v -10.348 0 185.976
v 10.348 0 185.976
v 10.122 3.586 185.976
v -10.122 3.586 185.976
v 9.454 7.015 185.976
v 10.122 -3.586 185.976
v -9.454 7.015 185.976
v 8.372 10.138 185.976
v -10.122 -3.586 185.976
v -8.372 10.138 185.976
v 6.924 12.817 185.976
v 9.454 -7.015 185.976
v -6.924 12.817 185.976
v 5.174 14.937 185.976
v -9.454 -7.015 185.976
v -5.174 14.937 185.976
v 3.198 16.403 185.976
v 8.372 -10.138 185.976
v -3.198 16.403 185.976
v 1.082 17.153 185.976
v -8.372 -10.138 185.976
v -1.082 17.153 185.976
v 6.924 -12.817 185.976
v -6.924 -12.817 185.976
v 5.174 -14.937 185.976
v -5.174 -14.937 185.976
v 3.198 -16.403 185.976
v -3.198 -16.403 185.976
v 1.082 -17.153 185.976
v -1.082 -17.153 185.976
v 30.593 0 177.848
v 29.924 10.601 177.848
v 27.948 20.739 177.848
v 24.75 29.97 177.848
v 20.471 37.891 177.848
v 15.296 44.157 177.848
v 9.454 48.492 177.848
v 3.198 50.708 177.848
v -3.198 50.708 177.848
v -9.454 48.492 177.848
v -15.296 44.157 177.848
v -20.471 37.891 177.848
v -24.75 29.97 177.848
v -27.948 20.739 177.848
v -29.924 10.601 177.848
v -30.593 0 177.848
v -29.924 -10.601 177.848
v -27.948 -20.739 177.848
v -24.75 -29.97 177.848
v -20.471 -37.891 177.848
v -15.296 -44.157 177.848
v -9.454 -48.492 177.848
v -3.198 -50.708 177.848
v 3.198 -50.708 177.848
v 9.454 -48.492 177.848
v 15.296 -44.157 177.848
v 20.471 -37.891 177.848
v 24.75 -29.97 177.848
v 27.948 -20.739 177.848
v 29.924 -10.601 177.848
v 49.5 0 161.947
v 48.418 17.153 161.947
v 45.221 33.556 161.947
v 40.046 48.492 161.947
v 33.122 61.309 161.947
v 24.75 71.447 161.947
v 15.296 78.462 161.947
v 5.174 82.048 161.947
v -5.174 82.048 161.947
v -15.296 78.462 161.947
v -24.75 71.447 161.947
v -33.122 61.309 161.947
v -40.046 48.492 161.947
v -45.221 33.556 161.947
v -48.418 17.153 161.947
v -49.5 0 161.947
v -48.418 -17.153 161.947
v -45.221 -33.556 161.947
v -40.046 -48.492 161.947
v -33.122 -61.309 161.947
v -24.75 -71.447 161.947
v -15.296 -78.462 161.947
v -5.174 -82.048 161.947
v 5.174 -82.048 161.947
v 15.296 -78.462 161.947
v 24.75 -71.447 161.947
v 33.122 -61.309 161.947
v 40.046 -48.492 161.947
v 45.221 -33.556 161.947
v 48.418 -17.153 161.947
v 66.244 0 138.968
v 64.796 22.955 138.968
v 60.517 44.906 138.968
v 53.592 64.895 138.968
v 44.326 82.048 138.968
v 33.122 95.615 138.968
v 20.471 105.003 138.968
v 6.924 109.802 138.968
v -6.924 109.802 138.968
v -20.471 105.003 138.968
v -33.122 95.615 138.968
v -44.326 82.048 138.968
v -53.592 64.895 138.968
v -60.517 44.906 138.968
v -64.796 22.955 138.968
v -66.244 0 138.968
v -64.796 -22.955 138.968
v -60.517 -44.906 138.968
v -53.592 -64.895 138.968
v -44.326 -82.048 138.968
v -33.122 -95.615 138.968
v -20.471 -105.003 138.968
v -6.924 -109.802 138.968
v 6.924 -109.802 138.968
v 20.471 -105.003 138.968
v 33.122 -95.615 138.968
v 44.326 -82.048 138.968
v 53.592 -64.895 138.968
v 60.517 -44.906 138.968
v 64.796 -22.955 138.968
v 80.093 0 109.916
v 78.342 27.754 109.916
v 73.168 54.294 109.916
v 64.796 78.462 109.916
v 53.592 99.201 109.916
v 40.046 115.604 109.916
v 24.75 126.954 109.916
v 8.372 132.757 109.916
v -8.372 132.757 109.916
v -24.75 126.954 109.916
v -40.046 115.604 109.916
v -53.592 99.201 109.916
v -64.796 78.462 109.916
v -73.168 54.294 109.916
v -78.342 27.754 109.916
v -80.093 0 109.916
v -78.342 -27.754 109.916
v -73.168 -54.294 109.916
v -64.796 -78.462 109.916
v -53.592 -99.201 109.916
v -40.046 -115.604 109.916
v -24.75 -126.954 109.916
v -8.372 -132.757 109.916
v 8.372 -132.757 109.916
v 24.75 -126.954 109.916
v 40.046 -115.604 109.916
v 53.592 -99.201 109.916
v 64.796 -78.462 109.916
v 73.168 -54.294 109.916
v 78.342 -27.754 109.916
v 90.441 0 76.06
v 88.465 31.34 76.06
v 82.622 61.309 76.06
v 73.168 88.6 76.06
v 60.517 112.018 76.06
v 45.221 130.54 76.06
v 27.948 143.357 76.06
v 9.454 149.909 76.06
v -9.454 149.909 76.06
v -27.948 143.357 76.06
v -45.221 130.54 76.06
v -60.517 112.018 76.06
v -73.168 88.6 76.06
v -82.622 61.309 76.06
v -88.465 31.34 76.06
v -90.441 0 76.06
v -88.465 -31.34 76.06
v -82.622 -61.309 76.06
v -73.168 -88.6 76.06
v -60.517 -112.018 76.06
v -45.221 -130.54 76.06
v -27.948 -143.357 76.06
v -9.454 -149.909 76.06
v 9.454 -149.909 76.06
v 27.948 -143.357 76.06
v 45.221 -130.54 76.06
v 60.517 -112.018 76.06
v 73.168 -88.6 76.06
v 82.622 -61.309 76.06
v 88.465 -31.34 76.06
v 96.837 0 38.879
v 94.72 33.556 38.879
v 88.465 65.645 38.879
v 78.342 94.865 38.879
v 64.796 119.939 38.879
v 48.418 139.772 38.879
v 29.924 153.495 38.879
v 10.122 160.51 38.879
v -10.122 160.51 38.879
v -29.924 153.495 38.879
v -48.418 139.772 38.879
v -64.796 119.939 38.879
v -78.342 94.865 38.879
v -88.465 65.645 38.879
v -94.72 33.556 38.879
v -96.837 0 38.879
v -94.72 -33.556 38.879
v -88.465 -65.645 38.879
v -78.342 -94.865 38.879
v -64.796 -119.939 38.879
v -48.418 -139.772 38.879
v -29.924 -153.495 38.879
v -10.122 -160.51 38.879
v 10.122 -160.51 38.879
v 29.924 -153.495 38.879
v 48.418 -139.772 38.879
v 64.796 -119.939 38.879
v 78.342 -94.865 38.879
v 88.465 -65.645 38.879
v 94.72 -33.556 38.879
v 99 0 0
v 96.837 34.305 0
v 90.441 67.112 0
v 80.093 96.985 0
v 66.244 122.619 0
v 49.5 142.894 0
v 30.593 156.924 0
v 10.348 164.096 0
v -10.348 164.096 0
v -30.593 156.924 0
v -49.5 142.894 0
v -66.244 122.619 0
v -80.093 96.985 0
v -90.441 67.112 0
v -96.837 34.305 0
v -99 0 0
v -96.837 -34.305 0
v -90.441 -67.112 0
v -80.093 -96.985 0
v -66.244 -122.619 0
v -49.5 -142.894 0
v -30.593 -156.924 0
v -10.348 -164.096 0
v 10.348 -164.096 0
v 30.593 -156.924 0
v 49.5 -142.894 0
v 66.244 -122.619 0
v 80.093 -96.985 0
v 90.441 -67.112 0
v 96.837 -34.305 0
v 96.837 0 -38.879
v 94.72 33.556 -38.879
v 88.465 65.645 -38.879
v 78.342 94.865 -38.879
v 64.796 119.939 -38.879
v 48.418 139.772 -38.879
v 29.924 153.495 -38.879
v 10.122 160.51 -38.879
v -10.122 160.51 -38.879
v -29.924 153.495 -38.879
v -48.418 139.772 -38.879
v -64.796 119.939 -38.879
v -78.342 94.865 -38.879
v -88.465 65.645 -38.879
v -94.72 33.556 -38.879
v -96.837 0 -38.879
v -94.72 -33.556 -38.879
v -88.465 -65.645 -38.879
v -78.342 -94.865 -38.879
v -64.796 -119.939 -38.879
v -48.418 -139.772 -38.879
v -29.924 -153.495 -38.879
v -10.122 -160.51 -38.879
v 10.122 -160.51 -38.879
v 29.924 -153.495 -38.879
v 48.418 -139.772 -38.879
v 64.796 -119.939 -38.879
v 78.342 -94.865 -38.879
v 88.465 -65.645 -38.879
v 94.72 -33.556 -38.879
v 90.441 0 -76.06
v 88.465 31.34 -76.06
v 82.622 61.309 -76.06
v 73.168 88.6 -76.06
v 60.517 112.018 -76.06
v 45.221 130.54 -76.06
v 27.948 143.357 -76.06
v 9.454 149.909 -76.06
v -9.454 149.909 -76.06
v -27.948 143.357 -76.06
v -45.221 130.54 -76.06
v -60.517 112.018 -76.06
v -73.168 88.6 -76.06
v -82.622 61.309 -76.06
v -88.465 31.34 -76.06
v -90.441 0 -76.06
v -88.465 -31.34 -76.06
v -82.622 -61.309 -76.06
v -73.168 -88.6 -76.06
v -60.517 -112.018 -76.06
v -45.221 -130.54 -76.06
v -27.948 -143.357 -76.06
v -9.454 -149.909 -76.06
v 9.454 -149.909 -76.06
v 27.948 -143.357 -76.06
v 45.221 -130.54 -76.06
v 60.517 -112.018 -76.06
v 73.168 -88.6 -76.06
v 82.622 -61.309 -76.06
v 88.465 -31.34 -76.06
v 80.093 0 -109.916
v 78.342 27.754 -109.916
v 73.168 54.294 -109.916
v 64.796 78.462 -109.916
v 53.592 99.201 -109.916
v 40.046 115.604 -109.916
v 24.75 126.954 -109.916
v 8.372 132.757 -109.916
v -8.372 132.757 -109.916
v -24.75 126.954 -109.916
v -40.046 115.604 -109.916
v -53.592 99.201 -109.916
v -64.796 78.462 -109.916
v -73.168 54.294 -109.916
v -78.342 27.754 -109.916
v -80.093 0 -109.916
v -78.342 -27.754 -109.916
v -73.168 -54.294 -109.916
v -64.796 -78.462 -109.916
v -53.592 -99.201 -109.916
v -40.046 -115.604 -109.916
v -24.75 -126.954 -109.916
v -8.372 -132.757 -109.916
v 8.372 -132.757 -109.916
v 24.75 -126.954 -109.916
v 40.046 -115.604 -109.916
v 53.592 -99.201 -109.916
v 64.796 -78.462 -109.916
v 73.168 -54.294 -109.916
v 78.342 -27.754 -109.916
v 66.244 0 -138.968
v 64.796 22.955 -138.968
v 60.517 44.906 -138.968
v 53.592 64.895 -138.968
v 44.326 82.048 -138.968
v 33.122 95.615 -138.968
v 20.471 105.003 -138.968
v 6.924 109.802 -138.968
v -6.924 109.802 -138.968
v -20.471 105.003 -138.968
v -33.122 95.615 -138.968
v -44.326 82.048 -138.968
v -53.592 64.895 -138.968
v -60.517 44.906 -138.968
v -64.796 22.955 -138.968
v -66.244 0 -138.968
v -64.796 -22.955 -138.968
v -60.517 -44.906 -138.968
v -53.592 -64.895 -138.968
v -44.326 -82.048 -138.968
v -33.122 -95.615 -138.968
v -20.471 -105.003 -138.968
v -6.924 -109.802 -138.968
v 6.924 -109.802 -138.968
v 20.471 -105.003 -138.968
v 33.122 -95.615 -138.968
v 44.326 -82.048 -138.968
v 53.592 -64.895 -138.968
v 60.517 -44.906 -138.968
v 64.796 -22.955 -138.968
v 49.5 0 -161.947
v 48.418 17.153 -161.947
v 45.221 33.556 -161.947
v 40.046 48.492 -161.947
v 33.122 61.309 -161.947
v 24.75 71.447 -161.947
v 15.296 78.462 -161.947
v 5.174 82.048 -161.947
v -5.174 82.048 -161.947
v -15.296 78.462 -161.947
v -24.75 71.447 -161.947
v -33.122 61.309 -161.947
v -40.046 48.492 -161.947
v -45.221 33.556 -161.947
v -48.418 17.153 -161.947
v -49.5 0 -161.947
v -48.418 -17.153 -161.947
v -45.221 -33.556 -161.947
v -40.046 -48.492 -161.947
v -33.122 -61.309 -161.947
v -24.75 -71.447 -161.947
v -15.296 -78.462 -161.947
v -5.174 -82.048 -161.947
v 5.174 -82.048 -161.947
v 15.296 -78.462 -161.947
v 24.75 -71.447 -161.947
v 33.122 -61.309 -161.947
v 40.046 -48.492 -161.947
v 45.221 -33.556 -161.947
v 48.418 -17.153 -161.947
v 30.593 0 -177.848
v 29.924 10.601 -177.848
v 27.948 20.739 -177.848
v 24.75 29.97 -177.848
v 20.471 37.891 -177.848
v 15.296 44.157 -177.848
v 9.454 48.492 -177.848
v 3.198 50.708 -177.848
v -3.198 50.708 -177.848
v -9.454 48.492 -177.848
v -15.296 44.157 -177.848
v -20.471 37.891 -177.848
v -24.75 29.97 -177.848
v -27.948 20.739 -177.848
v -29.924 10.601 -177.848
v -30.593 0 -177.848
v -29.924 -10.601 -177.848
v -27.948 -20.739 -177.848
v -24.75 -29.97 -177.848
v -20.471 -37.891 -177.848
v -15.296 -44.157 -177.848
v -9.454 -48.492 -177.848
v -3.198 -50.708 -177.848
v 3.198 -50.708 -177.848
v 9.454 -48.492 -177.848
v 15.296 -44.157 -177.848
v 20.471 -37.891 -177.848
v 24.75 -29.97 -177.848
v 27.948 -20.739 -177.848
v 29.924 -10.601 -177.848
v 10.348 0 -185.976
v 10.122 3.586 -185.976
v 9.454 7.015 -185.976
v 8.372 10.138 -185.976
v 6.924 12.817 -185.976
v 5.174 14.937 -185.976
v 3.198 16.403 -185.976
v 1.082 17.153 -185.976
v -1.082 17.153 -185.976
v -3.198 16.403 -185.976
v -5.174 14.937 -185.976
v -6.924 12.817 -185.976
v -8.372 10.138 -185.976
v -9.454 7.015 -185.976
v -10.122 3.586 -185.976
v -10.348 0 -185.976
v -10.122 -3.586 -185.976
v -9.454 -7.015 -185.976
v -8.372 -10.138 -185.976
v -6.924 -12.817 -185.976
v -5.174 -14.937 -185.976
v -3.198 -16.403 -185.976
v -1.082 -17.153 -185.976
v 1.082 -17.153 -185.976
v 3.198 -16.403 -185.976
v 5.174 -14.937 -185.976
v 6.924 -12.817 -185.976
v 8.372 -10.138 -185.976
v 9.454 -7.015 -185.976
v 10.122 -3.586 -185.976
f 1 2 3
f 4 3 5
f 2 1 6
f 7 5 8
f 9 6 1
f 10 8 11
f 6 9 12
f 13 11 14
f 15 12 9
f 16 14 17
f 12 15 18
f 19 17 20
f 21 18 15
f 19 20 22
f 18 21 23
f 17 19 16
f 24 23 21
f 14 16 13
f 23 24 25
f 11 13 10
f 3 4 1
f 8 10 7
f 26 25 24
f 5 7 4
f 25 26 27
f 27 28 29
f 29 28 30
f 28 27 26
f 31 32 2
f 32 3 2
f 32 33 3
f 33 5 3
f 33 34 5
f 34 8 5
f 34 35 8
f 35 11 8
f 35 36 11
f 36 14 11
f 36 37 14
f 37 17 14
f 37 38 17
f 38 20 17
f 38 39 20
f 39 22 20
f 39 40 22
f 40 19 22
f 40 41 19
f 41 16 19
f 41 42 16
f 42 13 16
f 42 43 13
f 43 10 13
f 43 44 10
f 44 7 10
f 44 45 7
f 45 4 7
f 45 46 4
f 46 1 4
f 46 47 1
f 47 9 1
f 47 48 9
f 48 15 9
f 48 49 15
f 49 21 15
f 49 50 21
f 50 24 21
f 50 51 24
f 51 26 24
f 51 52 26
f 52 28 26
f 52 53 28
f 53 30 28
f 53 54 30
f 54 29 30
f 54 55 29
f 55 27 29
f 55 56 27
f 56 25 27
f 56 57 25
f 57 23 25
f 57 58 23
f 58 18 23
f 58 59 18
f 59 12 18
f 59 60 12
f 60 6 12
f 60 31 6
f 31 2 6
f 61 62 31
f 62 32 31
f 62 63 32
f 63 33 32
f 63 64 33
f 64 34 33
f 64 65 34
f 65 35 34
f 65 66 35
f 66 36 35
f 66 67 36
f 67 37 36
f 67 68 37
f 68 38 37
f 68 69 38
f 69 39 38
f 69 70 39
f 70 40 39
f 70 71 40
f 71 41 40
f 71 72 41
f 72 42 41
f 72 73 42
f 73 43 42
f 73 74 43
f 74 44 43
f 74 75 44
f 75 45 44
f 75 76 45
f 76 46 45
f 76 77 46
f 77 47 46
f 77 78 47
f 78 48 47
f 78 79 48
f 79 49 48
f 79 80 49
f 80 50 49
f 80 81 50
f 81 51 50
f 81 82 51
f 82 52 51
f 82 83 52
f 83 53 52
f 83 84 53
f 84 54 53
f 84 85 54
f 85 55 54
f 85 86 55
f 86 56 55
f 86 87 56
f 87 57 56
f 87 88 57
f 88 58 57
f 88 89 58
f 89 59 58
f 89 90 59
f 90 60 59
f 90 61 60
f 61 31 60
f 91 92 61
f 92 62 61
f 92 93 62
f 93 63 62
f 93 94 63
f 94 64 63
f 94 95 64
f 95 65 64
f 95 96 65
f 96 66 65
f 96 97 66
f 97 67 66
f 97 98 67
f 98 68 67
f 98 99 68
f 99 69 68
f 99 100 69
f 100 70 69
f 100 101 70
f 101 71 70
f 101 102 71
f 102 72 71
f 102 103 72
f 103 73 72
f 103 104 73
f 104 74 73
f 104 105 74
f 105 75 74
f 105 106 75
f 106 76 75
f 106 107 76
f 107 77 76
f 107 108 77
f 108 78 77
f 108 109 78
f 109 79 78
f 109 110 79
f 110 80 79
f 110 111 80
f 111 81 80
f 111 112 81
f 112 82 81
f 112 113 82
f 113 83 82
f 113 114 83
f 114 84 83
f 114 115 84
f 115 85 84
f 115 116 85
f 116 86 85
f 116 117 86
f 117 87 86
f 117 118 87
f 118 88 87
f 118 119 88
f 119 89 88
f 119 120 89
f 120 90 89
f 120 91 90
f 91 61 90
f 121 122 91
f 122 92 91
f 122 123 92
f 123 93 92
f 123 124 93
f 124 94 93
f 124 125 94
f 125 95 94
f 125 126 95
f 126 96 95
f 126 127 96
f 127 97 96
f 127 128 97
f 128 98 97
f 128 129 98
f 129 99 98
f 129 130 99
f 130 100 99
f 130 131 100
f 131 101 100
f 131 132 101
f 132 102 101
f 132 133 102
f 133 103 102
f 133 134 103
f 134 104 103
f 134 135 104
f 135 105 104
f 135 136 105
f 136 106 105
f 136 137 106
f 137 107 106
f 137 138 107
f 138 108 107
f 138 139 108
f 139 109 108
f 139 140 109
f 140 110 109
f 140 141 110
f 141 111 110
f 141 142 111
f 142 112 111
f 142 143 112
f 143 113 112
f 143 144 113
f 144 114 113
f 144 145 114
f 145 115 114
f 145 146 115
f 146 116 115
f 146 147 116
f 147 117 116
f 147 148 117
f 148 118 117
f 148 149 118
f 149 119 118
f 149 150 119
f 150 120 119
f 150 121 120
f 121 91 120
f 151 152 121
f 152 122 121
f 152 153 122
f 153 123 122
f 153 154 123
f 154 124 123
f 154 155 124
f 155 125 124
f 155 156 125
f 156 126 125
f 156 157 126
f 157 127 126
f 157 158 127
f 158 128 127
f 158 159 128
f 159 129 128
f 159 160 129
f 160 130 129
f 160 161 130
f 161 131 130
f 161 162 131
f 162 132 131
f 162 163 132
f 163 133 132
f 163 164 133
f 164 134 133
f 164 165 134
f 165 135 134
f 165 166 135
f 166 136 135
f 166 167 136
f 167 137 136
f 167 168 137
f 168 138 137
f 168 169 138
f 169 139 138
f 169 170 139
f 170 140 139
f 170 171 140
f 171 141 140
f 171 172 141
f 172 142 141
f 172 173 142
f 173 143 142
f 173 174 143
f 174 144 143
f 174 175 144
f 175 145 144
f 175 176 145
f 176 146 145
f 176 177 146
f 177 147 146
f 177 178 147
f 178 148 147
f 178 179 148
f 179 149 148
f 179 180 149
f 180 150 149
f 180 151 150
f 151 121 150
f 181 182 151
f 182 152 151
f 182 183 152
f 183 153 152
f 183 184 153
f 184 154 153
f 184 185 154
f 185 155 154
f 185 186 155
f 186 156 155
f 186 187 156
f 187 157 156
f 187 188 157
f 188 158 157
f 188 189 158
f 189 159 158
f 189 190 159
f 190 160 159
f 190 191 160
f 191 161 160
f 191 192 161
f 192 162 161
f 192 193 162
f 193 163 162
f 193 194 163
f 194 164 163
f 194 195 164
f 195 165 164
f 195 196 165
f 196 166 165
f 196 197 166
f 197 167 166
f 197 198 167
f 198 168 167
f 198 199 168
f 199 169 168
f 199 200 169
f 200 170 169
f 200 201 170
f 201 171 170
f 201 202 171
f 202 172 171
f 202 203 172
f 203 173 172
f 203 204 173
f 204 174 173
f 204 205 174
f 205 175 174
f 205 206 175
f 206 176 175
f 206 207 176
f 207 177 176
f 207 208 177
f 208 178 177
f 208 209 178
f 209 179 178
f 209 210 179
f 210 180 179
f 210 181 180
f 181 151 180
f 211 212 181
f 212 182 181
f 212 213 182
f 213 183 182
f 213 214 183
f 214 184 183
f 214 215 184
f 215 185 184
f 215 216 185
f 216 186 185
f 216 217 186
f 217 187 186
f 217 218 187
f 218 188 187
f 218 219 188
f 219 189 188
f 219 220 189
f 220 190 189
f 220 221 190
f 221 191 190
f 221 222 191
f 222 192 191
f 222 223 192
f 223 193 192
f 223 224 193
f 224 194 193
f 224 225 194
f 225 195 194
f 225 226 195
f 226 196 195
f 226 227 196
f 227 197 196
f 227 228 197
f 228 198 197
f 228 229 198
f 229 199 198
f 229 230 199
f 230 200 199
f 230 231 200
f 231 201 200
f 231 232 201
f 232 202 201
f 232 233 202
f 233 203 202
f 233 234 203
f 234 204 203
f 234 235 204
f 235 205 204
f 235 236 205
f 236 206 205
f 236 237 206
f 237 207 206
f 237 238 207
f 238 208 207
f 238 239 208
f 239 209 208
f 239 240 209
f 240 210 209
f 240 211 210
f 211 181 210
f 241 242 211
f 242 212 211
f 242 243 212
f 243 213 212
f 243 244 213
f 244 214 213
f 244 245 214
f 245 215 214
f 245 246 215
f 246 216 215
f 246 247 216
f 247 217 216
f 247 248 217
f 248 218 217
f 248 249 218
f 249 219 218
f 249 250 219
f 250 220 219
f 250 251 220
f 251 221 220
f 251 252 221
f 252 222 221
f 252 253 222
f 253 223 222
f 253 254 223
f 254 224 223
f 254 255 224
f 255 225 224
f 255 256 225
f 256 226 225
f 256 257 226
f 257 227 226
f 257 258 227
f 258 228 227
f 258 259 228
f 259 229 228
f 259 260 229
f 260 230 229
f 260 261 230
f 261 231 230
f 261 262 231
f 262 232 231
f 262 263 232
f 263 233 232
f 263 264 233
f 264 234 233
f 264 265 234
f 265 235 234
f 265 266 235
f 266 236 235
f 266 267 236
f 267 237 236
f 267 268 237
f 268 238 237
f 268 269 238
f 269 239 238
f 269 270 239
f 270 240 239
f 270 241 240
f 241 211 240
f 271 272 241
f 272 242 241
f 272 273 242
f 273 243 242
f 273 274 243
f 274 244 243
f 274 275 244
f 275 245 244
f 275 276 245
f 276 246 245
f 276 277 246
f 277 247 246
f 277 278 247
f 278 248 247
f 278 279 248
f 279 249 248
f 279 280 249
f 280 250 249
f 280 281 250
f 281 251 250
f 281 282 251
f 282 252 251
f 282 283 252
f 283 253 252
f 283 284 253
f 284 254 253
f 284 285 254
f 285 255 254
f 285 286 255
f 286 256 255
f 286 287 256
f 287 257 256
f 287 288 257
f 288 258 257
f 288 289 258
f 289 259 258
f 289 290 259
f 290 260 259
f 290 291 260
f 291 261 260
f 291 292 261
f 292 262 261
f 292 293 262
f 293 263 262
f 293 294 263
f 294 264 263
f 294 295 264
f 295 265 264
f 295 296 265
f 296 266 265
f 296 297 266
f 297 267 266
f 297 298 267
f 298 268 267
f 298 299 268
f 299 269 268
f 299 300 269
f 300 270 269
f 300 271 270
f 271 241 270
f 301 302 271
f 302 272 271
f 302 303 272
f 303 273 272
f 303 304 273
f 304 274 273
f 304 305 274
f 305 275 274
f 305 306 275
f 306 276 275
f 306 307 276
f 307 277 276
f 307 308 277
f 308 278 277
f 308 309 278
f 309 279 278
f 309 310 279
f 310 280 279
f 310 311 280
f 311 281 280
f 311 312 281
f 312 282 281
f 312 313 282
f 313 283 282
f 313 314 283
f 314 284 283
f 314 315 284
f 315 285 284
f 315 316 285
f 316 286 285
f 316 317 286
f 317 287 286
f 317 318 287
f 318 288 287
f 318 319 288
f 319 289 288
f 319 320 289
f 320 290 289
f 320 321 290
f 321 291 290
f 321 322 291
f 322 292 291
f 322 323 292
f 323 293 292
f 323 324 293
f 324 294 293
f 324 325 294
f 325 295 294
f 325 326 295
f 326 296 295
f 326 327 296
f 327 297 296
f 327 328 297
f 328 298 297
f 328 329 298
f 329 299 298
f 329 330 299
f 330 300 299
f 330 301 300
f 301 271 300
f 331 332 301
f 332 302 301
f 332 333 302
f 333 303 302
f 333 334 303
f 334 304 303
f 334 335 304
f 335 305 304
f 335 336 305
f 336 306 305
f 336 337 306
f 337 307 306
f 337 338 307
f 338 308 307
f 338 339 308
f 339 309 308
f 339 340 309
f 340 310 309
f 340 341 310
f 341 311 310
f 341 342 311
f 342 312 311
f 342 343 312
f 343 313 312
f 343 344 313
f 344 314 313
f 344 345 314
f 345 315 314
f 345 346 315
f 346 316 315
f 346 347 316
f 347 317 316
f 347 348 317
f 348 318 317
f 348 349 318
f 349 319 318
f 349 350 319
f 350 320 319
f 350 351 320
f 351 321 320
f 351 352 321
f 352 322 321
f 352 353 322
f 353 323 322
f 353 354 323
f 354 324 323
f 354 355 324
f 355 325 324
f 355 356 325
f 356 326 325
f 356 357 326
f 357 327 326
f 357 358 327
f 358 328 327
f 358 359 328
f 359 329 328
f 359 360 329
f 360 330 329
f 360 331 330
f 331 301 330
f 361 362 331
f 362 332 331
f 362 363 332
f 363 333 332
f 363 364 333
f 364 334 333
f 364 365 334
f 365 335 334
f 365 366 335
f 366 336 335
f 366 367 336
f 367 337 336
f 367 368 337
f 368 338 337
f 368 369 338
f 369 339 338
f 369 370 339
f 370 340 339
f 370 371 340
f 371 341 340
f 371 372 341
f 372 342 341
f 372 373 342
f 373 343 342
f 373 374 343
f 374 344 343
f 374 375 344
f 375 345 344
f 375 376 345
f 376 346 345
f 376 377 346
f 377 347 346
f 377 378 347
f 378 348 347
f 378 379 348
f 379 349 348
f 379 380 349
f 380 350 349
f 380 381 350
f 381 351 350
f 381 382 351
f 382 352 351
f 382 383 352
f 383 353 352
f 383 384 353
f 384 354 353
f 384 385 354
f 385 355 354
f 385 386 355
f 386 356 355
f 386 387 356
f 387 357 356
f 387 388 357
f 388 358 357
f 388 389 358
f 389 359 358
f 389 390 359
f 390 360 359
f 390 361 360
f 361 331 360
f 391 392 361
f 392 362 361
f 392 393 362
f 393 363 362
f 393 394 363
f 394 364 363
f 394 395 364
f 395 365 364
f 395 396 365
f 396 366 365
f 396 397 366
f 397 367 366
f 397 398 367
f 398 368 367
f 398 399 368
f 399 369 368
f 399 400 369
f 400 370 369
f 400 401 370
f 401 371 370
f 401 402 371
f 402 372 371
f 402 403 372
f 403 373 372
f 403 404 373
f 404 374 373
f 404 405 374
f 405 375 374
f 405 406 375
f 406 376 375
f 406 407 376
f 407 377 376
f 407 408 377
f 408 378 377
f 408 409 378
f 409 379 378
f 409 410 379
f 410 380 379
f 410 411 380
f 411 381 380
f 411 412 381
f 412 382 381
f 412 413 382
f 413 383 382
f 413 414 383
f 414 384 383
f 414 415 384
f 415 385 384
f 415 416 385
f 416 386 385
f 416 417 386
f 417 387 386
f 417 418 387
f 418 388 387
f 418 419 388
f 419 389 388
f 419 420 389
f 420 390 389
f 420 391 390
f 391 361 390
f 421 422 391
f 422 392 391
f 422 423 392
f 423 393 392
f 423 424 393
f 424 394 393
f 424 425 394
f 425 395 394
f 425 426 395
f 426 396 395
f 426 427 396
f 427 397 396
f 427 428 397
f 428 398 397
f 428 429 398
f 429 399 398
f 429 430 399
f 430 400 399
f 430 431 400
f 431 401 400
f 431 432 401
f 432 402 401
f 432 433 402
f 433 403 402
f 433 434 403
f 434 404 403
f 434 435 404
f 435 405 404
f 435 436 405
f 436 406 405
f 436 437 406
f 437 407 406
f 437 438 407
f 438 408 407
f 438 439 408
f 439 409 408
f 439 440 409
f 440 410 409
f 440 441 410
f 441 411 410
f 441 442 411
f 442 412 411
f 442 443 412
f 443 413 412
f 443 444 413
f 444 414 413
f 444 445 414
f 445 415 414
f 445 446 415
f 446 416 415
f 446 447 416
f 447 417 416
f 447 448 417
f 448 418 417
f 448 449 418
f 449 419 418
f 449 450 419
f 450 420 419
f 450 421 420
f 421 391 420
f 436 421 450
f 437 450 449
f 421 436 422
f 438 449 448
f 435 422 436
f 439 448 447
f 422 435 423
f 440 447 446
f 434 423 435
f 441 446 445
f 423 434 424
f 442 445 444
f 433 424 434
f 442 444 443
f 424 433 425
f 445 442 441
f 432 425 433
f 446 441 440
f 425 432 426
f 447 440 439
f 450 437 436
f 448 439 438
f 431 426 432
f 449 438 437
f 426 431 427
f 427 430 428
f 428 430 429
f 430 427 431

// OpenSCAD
// Generated by SolidPython 1.0.1 on 2020-07-29 00:46:49


scale(v = [9, 15, 17]) {
	sphere(r = 11);
}
/***********************************************
*********      SolidPython code:      **********
************************************************
 
# import packages: SolidPython
from solid import *
from solid.utils import *
from itertools import chain, combinations, permutations


class Resize:

    def __init__(self, scad_file):
        self.scad_file = scad_file
        #self.scad_file = import_scad(scad_file)
        # cone/cylinder param:
        self.r1 = 0
        self.r2 = 0
        self.h = 0
        # rectangular prism param:
        self.w = 0
        self.l = 0
        # ellipse param:
        self.r = 0

    # import OpenScad code (file name corresponds to shape)


    # classify shape + parameters
    def assign(self, param1, param2, param3):
        if self.scad_file == 'cone.scad':
            self.r1 = param1
            self.r2 = param2
            self.h = param3
        elif self.scad_file == 'cylinder.scad':
            self.r1 = param1
            self.r2 = param2
            self.h = param3
        elif self.scad_file == 'rectangularPrism.scad':
            self.h = param1
            self.l = param2
            self.w = param3
        else:
            self.r = param1
            self.h = param2

    # resize parameters
    def iterate(self):
        x = range(3, 20, 2)
        i = 1
        if self.scad_file == 'cone.scad':
            tempList = list(permutations(x, 2))
            for temp in tempList:
                param1 = temp[0]
                param2 = temp[1]
                filepath = 'produced_scad_files/' + 'cone' + str(param1) + '_' + str(param2) + '_' + '.scad'
                scad_render_to_file(cylinder(h=param1, r1=param2, r2=0), filepath)

        elif self.scad_file == 'cylinder.scad':
            tempList = list(permutations(x, 3))
            for temp in tempList:
                param1 = temp[0]
                param2 = temp[1]
                filepath = 'produced_scad_files/' + 'cylinder' + str(param1) + '_' + str(param2) + '_' + '.scad'
                scad_render_to_file(cylinder(h=param1, r1=param2, r2=param2), filepath)

        elif self.scad_file == 'rectangularPrism.scad':
            tempList = list(permutations(x, 3))
            for temp in tempList:
                param1 = temp[0]
                param2 = temp[1]
                param3 = temp[2]
                filepath = 'produced_scad_files/' + 'rectangularPrism' + str(param1) + '_' + str(param2) + '_' + str(
                    param3) + '.scad'
                scad_render_to_file(cube(size=(param1, param2, param3)), filepath)

        elif self.scad_file == 'ellipse.scad':
            tempList = list(permutations(x, 4))
            for temp in tempList:
                param1 = temp[0]
                param2 = temp[1]
                param3 = temp[2]
                param4 = temp[3]
                filepath = 'produced_scad_files/' + 'ellipse' + str(param1) + '_' + str(param2) + '_' + str(param3) + '_' + str(param4) + '.scad'
                scad_render_to_file(scale([param1, param2, param3])(sphere(r=param4)), filepath)

    def render_to_scadfile(self):
        scad_render_to_file(scad, 'example.scad') 
 
************************************************/
